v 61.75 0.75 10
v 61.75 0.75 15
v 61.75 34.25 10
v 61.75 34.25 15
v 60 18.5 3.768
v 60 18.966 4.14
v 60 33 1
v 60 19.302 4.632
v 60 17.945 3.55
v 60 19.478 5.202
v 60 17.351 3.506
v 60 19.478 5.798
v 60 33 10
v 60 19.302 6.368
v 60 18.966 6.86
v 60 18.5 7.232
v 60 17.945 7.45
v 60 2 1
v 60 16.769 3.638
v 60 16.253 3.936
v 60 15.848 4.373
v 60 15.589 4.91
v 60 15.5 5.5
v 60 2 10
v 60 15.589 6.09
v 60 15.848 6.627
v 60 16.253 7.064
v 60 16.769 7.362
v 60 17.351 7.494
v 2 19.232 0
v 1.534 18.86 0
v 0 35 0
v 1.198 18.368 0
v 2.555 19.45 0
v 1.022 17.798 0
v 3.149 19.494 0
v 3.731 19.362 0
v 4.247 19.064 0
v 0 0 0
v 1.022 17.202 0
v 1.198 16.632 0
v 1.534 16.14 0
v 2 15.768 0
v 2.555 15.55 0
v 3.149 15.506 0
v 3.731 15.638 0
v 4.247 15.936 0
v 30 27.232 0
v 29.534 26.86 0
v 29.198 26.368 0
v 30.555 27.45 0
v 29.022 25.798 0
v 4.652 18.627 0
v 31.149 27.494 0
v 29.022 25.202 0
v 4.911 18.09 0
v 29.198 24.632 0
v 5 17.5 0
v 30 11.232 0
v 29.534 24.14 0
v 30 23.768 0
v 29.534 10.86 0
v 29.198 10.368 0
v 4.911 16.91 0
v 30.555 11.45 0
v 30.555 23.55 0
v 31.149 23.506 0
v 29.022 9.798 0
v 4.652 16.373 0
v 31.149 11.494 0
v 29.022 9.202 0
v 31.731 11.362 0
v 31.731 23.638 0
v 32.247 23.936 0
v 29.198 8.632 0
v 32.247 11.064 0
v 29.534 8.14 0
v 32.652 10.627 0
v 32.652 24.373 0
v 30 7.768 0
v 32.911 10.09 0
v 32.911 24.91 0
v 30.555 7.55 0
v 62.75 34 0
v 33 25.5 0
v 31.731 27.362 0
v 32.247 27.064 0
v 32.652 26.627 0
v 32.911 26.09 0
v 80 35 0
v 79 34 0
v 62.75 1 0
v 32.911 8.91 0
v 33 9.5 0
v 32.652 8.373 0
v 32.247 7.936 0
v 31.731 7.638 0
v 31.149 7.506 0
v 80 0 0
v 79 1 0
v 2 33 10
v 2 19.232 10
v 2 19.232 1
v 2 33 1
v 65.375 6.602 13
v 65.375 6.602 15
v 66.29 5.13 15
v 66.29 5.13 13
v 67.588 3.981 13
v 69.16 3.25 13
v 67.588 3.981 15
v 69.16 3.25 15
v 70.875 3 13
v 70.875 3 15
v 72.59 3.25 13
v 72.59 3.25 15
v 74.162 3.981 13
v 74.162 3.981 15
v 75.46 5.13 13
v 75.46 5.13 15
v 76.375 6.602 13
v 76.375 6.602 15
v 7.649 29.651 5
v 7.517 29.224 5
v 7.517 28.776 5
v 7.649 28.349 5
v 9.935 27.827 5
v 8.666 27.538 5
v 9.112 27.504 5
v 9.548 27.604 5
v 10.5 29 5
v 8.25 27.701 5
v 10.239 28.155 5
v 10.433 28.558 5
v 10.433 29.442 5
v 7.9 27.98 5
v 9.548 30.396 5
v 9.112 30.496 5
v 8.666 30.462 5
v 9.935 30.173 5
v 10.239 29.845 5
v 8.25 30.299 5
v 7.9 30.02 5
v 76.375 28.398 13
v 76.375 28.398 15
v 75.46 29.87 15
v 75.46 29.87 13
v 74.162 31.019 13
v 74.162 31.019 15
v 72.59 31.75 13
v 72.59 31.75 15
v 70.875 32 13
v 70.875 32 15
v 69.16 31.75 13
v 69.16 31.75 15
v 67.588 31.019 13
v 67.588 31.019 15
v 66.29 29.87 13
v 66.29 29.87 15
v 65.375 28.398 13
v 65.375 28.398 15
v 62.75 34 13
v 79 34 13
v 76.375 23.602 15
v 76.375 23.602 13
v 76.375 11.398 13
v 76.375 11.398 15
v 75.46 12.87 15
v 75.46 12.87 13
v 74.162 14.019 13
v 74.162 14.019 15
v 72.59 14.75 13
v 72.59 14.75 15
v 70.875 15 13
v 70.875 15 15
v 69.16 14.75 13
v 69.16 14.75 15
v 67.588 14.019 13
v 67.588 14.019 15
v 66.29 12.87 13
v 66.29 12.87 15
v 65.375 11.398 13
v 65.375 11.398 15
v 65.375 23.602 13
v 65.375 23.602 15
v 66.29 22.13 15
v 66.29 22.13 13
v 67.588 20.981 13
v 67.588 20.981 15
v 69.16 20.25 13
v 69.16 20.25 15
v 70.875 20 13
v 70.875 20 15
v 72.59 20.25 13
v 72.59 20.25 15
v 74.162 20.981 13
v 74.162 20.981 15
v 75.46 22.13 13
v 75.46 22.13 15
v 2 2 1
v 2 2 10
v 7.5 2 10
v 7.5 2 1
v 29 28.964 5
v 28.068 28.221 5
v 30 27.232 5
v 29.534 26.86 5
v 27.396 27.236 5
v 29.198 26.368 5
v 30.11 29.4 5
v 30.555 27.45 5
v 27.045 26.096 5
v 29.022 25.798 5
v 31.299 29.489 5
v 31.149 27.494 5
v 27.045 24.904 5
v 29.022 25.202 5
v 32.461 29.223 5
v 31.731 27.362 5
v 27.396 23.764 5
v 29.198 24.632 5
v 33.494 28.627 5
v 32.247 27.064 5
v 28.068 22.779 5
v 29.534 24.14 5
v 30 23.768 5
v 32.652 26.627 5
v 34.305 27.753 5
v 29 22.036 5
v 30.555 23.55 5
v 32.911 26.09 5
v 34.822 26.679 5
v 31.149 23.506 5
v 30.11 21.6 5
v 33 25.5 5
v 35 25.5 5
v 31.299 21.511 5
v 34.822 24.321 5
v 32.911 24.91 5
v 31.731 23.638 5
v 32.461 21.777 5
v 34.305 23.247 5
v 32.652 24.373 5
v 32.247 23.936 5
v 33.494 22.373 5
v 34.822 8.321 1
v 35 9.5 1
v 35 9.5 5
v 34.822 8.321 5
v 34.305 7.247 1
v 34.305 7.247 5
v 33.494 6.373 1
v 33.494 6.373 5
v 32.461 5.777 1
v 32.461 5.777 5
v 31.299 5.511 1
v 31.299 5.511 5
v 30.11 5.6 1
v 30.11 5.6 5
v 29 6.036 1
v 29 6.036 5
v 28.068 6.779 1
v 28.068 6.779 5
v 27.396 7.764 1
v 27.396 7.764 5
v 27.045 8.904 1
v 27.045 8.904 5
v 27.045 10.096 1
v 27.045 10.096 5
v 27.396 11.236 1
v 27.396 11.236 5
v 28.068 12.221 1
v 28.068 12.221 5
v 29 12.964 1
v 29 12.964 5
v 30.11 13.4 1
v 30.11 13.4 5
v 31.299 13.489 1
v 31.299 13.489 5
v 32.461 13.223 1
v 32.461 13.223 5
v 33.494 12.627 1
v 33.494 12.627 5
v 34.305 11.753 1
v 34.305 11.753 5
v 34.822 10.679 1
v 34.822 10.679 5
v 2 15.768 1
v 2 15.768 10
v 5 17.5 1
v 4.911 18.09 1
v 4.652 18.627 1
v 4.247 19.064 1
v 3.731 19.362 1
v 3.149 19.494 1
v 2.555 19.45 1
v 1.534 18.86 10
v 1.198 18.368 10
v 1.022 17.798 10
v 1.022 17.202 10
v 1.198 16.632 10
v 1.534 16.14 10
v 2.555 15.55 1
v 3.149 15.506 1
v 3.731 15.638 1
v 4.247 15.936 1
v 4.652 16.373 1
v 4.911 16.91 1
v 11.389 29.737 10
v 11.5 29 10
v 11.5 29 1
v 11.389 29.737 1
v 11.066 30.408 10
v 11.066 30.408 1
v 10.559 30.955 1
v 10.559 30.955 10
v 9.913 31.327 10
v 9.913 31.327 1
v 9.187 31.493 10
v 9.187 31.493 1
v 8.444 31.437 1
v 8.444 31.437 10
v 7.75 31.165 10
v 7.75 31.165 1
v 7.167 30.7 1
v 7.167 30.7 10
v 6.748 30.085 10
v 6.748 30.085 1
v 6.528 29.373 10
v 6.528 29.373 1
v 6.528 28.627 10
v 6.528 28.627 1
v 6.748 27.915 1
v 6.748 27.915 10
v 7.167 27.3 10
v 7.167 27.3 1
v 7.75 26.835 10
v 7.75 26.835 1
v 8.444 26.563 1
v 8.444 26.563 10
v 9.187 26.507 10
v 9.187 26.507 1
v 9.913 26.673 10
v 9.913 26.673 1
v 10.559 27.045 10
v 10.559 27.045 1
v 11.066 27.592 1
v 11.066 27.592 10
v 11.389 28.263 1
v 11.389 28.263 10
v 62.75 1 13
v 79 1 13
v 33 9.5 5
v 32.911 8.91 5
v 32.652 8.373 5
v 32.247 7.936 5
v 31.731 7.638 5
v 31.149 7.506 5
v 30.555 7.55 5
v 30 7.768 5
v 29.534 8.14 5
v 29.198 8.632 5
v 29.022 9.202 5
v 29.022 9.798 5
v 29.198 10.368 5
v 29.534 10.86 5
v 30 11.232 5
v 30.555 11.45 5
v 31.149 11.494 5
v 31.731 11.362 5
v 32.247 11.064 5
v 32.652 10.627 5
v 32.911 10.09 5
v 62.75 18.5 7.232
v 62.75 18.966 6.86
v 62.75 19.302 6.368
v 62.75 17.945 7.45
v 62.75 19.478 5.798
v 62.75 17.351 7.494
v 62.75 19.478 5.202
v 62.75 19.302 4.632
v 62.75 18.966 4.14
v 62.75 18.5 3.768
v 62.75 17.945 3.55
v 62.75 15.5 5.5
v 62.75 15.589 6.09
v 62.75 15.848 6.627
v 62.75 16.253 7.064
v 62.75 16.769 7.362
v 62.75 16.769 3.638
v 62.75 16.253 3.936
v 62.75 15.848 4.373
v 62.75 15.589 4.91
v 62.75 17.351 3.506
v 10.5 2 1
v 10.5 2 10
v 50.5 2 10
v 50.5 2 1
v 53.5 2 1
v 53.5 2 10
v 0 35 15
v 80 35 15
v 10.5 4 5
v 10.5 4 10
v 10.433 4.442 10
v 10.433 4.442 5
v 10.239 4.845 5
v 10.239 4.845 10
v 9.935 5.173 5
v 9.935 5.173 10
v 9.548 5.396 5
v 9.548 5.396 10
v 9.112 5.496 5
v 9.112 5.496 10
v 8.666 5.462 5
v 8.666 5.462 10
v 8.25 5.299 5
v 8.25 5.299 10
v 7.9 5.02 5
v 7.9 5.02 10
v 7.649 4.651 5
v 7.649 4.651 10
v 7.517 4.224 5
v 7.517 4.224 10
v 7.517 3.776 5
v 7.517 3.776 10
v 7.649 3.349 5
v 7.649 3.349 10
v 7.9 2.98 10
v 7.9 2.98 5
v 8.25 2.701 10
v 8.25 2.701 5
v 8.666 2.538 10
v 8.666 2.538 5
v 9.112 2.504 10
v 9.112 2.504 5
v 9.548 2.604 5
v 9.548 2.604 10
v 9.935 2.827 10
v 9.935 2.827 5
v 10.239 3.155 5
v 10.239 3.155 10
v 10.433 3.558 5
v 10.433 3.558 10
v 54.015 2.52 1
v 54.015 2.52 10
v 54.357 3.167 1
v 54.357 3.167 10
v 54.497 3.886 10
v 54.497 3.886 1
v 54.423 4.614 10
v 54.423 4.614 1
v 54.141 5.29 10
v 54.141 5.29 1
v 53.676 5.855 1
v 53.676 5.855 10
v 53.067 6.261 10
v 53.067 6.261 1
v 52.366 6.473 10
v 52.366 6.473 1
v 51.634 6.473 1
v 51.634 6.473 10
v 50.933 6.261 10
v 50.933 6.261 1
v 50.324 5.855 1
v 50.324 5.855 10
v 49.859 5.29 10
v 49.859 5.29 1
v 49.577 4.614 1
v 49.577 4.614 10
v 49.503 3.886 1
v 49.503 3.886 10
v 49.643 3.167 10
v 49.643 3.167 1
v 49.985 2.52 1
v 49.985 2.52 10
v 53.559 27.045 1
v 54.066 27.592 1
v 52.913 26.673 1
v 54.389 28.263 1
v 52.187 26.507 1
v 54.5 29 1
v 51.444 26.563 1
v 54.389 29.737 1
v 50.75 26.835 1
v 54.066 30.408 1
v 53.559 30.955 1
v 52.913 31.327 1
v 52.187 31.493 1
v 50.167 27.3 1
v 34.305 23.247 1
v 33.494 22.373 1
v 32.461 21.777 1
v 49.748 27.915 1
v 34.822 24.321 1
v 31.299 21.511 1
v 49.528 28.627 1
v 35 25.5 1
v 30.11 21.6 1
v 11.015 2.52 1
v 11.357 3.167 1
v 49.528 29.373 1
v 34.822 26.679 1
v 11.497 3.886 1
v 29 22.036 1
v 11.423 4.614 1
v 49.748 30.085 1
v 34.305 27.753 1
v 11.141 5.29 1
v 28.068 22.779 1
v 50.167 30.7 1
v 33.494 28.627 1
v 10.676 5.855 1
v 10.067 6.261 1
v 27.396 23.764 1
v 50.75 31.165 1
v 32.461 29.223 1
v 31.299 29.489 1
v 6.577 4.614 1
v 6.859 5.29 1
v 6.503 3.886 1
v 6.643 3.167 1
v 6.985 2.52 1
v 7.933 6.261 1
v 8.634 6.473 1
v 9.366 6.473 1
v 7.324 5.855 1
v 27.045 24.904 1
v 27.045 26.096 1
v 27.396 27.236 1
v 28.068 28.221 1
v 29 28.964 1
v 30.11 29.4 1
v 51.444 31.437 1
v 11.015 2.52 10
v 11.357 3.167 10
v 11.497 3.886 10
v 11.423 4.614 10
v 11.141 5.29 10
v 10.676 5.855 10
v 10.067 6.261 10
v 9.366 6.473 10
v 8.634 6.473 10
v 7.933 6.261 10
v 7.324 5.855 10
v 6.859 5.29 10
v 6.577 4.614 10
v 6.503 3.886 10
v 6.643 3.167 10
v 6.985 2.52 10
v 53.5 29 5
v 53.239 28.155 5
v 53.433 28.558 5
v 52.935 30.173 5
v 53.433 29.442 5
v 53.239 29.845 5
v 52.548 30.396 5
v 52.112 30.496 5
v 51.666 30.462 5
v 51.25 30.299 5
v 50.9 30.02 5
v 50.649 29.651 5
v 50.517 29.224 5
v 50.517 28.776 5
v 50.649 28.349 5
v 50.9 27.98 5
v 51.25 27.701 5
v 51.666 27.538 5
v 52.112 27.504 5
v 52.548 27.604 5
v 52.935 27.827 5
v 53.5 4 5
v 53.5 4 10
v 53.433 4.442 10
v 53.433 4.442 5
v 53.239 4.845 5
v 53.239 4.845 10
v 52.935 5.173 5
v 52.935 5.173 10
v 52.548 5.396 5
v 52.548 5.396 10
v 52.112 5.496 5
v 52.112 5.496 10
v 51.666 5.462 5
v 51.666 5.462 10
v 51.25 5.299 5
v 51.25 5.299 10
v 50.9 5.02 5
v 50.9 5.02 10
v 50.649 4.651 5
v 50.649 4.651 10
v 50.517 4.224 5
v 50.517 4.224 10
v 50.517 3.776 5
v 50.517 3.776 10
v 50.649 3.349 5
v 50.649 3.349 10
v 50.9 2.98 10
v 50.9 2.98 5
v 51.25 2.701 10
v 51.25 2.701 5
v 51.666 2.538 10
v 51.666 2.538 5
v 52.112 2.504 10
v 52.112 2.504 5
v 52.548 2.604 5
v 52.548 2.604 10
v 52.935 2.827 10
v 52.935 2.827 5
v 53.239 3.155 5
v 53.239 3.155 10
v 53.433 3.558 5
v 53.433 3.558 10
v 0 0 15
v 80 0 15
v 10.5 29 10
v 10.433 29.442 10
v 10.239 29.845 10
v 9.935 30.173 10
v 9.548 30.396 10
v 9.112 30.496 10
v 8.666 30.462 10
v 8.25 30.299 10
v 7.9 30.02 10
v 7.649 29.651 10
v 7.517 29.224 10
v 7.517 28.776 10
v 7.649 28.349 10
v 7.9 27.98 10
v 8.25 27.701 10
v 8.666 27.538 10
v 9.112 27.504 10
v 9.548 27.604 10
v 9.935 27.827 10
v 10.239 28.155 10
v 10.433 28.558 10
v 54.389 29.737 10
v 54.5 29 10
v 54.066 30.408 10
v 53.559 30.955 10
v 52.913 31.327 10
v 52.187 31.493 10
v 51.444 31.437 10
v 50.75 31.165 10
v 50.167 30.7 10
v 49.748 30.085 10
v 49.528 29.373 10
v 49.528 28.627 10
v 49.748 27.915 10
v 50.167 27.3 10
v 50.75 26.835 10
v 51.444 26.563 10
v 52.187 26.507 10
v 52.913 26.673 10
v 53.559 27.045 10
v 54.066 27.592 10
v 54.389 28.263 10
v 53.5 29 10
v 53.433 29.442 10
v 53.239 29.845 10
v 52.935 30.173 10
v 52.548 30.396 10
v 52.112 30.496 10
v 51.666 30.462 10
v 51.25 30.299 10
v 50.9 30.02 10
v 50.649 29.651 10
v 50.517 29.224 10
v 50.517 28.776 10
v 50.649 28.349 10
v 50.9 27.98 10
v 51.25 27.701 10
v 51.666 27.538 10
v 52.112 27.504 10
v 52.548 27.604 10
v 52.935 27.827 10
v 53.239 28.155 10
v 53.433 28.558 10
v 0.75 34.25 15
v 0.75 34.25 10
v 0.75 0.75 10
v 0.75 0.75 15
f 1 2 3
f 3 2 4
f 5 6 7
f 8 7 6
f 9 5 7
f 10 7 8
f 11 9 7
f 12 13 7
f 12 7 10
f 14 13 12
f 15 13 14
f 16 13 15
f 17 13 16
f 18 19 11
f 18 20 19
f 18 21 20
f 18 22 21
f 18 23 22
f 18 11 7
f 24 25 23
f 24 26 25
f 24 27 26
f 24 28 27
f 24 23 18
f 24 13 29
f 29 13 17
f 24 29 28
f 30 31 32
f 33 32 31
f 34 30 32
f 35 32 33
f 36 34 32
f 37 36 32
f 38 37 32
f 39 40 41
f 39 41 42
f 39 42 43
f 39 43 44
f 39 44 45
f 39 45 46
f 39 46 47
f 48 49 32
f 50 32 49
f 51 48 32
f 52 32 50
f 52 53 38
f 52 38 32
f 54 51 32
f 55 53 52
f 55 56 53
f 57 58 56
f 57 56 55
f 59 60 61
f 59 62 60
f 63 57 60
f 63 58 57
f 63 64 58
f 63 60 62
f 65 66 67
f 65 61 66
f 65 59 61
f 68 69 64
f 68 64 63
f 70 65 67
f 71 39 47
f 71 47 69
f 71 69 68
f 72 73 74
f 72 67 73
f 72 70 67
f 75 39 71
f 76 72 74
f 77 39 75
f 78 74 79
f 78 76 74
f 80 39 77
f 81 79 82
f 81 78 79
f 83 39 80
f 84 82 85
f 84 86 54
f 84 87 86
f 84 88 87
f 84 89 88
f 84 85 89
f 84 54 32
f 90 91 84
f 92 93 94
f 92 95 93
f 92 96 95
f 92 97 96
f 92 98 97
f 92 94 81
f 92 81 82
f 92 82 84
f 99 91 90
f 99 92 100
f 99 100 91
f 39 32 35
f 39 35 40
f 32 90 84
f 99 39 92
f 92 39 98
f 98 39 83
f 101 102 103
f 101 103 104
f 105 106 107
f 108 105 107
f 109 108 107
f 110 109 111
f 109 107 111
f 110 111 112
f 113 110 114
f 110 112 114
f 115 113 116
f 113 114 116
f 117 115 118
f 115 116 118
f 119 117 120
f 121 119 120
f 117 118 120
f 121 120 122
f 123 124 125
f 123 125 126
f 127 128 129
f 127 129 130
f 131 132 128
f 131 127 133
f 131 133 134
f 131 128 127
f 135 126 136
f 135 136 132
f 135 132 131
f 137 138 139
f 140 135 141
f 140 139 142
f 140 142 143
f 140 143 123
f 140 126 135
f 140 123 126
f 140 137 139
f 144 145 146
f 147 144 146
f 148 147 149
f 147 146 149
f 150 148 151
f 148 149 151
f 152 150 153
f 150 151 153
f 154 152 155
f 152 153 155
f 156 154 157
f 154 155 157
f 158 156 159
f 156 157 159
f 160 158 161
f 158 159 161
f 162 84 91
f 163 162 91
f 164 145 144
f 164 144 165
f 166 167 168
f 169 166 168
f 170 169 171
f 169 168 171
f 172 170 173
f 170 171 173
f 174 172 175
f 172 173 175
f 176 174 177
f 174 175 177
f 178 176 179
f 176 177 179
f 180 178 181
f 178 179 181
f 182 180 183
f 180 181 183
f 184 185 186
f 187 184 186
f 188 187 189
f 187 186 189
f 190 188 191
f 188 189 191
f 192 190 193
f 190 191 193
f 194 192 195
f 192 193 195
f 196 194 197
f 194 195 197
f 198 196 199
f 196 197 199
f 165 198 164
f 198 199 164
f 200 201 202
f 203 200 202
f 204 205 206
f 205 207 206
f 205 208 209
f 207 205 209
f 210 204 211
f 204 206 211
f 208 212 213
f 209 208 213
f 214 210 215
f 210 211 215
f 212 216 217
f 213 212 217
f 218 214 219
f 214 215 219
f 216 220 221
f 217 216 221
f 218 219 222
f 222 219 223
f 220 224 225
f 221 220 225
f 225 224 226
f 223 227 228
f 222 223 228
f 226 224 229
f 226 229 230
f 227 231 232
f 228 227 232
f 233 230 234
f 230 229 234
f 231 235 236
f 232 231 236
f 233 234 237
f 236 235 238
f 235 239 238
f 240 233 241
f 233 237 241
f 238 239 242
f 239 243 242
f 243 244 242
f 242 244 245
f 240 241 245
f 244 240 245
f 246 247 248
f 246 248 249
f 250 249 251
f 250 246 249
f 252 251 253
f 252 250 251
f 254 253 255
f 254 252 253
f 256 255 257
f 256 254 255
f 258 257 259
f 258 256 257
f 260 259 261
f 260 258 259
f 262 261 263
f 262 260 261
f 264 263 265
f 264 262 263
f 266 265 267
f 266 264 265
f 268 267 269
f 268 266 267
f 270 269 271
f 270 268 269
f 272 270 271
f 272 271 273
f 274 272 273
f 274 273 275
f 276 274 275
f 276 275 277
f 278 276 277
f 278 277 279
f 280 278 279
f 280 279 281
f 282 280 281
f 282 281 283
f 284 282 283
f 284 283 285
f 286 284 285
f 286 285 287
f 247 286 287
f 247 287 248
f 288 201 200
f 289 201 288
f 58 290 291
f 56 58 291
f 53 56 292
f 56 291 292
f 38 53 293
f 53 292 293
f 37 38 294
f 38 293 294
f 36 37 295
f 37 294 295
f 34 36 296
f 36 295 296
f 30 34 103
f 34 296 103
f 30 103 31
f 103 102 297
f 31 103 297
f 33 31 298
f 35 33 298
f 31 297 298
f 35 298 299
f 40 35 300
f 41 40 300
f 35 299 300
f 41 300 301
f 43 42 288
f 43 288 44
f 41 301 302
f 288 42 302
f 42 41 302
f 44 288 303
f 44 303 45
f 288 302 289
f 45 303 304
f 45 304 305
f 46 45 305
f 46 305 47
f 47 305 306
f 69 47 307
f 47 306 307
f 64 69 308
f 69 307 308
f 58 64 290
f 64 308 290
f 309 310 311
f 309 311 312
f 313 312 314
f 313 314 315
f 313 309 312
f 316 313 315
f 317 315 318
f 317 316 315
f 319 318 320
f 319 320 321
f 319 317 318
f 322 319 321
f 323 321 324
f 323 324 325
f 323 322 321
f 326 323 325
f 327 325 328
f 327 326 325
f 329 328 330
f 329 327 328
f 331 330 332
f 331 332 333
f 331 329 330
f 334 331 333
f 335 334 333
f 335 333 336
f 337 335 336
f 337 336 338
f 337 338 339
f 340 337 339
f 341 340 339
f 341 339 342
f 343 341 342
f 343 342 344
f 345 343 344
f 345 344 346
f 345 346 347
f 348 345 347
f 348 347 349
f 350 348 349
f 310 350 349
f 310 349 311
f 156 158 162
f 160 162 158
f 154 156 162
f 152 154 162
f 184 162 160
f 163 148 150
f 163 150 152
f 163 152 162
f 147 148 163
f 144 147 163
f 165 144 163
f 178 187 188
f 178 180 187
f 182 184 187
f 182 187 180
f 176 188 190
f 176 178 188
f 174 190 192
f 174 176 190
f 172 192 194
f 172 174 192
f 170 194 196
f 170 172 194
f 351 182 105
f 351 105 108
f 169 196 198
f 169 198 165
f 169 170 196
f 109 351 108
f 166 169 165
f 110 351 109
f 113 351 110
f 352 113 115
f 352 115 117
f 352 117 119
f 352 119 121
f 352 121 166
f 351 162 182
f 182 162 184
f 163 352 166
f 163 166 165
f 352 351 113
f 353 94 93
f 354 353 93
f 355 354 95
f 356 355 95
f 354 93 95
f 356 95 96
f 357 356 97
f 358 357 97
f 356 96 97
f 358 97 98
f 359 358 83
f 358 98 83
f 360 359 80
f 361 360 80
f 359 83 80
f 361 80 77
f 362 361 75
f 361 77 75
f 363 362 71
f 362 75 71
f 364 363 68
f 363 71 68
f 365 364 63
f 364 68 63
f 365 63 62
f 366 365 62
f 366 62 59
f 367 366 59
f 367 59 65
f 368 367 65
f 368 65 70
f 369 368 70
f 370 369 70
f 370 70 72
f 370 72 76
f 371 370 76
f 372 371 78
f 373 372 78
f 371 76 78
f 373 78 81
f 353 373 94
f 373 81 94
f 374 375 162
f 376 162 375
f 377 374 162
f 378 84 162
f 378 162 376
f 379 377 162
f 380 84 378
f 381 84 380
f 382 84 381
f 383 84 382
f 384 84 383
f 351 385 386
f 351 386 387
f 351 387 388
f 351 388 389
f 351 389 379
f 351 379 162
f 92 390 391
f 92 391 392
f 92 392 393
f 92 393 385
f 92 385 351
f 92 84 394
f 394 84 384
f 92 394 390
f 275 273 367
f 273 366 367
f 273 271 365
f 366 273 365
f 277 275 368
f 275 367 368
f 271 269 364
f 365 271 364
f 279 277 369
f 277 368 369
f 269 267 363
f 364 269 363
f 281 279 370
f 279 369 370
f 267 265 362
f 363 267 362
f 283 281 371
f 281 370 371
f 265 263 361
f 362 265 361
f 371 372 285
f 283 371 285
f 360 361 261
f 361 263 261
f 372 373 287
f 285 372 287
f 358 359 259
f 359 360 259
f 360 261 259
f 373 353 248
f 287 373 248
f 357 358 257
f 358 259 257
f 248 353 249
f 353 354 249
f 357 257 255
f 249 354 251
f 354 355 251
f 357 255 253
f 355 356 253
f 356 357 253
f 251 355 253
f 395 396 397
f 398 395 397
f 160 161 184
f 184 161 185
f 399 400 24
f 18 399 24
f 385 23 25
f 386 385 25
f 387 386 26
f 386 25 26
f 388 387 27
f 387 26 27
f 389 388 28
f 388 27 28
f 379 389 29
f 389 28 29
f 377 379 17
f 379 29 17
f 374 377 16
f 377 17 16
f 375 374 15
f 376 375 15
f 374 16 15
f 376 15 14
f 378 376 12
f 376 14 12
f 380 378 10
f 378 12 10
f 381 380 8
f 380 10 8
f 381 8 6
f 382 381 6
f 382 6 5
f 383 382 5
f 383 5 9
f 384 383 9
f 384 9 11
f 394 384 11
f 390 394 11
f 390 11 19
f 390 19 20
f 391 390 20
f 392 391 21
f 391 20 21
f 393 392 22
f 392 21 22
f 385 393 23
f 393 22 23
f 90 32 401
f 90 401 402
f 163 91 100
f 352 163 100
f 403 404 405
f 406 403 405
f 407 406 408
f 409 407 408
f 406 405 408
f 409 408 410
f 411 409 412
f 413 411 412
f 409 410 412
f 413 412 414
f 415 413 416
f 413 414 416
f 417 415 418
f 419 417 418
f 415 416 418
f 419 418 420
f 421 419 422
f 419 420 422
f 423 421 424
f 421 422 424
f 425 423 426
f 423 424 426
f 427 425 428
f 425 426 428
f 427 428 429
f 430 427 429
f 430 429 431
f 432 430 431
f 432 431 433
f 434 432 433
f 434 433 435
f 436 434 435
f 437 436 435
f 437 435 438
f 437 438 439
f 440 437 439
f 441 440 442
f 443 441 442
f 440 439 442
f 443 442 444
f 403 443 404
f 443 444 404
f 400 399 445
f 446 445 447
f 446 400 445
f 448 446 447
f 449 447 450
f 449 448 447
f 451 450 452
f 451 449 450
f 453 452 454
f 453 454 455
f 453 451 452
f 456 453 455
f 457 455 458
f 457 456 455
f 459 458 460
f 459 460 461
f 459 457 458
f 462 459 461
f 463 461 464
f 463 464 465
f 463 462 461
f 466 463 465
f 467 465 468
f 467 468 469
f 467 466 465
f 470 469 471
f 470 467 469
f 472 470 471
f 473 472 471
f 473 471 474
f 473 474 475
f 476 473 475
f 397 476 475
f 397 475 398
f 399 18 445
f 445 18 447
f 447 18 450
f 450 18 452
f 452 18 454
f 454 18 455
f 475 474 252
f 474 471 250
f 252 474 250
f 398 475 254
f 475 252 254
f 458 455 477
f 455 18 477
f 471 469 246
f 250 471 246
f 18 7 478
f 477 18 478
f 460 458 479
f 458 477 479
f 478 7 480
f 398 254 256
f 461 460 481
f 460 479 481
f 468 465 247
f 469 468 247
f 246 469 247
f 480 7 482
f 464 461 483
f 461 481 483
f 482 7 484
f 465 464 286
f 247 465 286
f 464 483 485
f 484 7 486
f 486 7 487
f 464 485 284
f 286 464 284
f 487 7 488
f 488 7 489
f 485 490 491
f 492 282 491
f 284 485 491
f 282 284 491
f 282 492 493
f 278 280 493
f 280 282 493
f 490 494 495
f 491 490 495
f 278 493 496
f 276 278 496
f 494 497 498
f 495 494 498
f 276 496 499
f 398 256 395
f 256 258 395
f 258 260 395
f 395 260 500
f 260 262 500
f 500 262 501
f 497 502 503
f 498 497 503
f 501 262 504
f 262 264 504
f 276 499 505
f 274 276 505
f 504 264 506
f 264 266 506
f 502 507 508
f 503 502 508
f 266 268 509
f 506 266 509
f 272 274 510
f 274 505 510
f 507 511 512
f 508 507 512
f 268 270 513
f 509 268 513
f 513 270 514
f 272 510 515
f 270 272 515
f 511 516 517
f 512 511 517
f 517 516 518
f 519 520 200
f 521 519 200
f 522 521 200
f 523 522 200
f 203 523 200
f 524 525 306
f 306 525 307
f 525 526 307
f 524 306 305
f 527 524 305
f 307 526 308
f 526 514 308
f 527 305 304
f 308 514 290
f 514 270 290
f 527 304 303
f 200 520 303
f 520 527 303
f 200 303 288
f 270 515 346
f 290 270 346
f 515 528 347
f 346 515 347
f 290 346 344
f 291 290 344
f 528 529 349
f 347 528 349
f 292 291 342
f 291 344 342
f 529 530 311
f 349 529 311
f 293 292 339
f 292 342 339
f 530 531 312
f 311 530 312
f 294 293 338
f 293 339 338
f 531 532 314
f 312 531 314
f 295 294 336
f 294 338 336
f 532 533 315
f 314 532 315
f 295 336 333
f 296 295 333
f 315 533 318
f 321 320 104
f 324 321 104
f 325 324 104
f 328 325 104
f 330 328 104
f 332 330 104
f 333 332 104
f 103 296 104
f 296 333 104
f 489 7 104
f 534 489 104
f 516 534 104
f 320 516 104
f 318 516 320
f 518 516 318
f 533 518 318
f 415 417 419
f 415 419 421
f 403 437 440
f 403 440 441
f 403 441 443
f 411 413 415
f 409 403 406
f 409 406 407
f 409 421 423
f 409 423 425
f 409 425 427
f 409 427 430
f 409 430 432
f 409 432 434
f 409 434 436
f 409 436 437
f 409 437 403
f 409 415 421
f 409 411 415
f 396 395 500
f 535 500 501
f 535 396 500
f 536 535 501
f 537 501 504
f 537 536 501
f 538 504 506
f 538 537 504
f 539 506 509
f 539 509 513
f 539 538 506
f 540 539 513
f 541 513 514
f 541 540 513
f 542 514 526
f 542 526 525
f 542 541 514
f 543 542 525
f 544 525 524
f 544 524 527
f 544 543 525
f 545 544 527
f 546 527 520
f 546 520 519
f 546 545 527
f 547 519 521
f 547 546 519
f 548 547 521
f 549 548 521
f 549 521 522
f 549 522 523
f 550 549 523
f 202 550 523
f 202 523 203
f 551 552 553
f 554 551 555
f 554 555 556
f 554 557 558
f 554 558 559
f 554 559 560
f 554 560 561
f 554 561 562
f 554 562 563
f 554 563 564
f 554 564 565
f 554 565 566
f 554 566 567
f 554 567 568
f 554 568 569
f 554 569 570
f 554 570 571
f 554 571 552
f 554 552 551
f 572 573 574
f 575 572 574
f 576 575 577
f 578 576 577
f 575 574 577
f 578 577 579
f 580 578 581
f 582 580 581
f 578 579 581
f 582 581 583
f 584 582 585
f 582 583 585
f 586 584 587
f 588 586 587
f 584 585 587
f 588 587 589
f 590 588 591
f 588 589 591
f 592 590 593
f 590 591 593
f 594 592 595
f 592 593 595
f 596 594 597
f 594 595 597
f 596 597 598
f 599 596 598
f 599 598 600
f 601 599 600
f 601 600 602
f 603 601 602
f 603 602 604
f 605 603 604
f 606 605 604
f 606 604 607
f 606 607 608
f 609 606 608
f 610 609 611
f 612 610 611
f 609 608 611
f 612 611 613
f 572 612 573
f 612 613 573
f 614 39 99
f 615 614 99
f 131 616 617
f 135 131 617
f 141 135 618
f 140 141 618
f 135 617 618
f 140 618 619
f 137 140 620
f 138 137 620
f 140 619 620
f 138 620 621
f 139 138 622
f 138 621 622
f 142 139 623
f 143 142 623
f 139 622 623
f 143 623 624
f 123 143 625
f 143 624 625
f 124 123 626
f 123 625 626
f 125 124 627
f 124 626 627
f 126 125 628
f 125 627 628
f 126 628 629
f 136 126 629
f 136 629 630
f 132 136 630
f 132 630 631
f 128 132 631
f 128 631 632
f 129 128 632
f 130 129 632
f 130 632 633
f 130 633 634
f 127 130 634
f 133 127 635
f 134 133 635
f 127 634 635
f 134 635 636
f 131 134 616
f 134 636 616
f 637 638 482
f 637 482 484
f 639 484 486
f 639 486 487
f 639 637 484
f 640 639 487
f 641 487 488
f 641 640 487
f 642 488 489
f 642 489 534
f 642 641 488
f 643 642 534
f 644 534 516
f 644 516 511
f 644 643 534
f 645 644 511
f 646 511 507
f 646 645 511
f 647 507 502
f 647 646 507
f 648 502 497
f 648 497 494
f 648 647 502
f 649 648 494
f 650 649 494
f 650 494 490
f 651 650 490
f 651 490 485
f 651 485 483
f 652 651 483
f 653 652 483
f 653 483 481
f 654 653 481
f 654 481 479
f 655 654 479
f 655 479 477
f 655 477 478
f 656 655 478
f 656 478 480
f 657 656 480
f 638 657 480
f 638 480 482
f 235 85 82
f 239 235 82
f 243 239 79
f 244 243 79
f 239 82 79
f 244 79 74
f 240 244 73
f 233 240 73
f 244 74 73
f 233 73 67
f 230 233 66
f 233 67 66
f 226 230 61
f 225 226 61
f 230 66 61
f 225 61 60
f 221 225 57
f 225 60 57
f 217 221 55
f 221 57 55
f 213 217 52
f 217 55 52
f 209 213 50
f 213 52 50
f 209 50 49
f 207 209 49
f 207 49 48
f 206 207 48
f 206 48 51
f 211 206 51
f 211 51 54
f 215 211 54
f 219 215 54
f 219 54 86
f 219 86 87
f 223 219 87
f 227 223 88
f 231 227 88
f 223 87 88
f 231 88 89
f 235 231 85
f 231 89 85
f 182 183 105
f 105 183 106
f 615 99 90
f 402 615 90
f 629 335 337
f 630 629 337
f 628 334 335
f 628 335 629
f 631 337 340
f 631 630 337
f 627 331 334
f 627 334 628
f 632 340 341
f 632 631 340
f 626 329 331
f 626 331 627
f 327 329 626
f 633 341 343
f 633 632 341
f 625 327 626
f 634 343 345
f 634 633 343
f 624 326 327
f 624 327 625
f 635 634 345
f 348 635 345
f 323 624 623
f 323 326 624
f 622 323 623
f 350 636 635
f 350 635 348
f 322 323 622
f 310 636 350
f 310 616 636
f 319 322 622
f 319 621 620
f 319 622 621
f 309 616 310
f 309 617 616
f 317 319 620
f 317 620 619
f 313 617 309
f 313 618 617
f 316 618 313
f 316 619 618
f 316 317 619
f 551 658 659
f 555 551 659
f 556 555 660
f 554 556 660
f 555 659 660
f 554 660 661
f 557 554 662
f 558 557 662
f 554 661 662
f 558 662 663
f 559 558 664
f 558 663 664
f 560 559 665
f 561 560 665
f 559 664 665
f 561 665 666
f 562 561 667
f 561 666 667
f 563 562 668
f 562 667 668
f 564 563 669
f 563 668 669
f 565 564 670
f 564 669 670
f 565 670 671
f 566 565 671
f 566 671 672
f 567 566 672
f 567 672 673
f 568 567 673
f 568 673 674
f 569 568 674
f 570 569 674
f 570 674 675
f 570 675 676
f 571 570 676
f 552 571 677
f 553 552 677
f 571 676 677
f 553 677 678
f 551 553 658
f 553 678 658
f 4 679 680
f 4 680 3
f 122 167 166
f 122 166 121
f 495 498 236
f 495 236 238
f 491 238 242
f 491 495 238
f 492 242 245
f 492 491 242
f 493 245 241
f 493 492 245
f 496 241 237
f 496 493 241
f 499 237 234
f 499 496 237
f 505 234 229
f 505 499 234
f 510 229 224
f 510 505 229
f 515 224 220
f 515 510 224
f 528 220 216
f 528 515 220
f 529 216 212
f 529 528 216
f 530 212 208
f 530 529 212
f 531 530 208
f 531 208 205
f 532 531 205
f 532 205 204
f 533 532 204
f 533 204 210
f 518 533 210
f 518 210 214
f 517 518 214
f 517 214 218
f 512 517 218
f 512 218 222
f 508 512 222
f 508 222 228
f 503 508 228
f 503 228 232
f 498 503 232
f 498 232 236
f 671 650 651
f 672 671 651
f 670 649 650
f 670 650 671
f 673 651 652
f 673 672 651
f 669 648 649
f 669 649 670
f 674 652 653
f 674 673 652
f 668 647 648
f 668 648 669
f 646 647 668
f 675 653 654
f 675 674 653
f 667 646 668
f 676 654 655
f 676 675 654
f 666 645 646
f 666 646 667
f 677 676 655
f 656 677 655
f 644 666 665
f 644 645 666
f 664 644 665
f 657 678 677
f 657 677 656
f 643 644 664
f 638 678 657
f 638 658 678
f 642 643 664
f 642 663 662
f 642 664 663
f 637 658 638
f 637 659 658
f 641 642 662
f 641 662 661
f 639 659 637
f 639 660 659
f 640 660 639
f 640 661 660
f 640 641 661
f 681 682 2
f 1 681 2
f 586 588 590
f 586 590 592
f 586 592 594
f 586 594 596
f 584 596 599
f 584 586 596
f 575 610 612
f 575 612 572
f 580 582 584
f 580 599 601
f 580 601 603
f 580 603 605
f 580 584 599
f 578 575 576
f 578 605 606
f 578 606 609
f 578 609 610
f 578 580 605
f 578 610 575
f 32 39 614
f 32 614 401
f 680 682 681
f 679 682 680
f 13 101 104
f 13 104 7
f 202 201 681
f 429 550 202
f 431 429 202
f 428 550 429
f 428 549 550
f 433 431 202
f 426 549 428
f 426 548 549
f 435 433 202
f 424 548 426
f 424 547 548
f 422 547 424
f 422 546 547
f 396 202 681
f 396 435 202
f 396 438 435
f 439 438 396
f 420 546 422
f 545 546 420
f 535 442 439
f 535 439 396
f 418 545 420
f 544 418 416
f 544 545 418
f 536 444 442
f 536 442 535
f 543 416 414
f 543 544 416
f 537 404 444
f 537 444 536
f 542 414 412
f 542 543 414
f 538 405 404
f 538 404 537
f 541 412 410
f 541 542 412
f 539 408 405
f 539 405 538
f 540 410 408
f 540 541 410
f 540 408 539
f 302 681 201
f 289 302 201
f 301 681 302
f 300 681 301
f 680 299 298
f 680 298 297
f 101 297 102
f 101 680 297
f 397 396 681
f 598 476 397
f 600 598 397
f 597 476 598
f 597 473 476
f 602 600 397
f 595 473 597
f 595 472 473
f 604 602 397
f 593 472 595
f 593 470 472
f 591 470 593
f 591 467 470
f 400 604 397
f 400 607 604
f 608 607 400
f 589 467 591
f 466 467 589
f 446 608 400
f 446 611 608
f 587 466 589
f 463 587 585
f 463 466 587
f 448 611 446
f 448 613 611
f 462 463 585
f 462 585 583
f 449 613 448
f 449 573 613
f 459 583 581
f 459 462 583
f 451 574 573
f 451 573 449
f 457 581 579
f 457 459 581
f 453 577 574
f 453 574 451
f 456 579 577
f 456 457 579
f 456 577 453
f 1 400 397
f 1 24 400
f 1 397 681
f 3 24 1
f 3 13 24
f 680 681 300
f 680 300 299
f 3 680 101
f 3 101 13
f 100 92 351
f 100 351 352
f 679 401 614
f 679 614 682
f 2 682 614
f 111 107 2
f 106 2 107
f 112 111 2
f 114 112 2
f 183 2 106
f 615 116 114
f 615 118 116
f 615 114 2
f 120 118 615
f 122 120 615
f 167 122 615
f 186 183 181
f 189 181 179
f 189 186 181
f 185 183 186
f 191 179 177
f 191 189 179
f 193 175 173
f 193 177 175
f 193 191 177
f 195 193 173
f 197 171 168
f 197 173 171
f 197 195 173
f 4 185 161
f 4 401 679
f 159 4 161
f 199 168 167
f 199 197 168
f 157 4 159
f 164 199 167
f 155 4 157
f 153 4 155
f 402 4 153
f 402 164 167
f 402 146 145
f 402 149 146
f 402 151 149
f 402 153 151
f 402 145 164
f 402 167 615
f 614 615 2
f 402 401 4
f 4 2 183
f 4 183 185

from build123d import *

# Parameters (mm, degrees)
SKETCH_W             = 80
SKETCH_H             = 35
PAD_DEPTH            = 15
SKETCH001_R          = 2.5
POCKET_DEPTH         = 14
SKETCH002_W          = 61
SKETCH002_H          = 33.5
POCKET001_DEPTH      = 5
SKETCH003_R          = 1.5
POCKET002_DEPTH      = 5
SKETCH004_R          = 4
PAD001_DEPTH         = 5
SKETCH005_R          = 2
POCKET003_DEPTH      = 5
SKETCH006_W          = 16.25
SKETCH006_H          = 33
POCKET004_DEPTH      = 13
POCKET005_DEPTH      = 15.001
SKETCH008_R          = 2
POCKET006_DEPTH      = 5.001
POCKET006_DEPTH_BACK = -10.001
SKETCH009_R          = 2
POCKET007_DEPTH      = 2.75


with BuildPart() as part:
    # Sketch → Pad (new body)
    with BuildSketch(Plane.XY):
        with Locations((40, 17.5)):
            Rectangle(SKETCH_W, SKETCH_H)
    extrude(amount=PAD_DEPTH)

    # Sketch001 (on Face6 of Pad) → Pocket (cut)
    with BuildSketch(Plane.XY.offset(15)):
        with BuildLine():
            Line((2, 33), (60, 33))
            Line((60, 33), (60, 2))
            Line((53.5, 2), (60, 2))
            ThreePointArc((53.5, 2), (52, 6.5), (50.5, 2))
            Line((10.5, 2), (50.5, 2))
            ThreePointArc((10.5, 2), (9, 6.5), (7.5, 2))
            Line((2, 2), (7.5, 2))
            Line((2, 2), (2, 33))
        make_face()
        with Locations((9, 29)):
            Circle(SKETCH001_R, mode=Mode.SUBTRACT)
        with Locations((52, 29)):
            Circle(SKETCH001_R, mode=Mode.SUBTRACT)
    extrude(amount=-POCKET_DEPTH, mode=Mode.SUBTRACT)

    # Sketch002 (on Face5 of Pocket) → Pocket001 (cut)
    with BuildSketch(Plane.XY.offset(15)):
        with Locations((31.25, 17.5)):
            Rectangle(SKETCH002_W, SKETCH002_H)
    extrude(amount=-POCKET001_DEPTH, mode=Mode.SUBTRACT)

    # Sketch003 (on Face24 of Pocket001) → Pocket002 (cut)
    with BuildSketch(Plane.XY.offset(10)):
        with Locations((9, 29)):
            Circle(SKETCH003_R)
        with Locations((9, 4)):
            Circle(SKETCH003_R)
        with Locations((52, 29)):
            Circle(SKETCH003_R)
        with Locations((52, 4)):
            Circle(SKETCH003_R)
    extrude(amount=-POCKET002_DEPTH, mode=Mode.SUBTRACT)

    # Sketch004 (on Face4 of Pocket002) → Pad001 (join)
    with BuildSketch(Plane(origin=(0, 0, 0), x_dir=(1, 0, 0), z_dir=(0, 0, -1))):
        with Locations((31, -9.5)):
            Circle(SKETCH004_R)
        with Locations((31, -25.5)):
            Circle(SKETCH004_R)
    extrude(amount=-PAD001_DEPTH)

    # Sketch005 (on Face4 of Pad001) → Pocket003 (cut)
    with BuildSketch(Plane(origin=(0, 0, 0), x_dir=(1, 0, 0), z_dir=(0, 0, -1))):
        with Locations((31, -9.5)):
            Circle(SKETCH005_R)
        with Locations((31, -25.5)):
            Circle(SKETCH005_R)
    extrude(amount=-POCKET003_DEPTH, mode=Mode.SUBTRACT)

    # Sketch006 (on Face4 of Pocket003) → Pocket004 (cut)
    with BuildSketch(Plane(origin=(0, 0, 0), x_dir=(1, 0, 0), z_dir=(0, 0, -1))):
        with Locations((70.875, -17.5)):
            Rectangle(SKETCH006_W, SKETCH006_H)
    extrude(amount=-POCKET004_DEPTH, mode=Mode.SUBTRACT)

    # Sketch007 (on Face5 of Pocket004) → Pocket005 (cut, through all)
    with BuildSketch(Plane.XY.offset(15)):
        with BuildLine():
            Line((65.375, 28.397916), (65.375, 23.602084))
            ThreePointArc((65.375, 23.602084), (70.875, 20), (76.375, 23.602084))
            Line((76.375, 28.397916), (76.375, 23.602084))
            ThreePointArc((76.375, 28.397916), (70.875, 32), (65.375, 28.397916))
        make_face()
        with BuildLine():
            Line((65.375, 11.397916), (65.375, 6.602084))
            ThreePointArc((65.375, 6.602084), (70.875, 3), (76.375, 6.602084))
            Line((76.375, 11.397916), (76.375, 6.602084))
            ThreePointArc((76.375, 11.397916), (70.875, 15), (65.375, 11.397916))
        make_face()
    extrude(amount=-POCKET005_DEPTH, mode=Mode.SUBTRACT)

    # Sketch008 (on Face43 of Pocket005) → Pocket006 (cut, two sides)
    with BuildSketch(Plane.XY.offset(5)) as pocket006_sk:
        with Locations((3, 17.5)):
            Circle(SKETCH008_R)
    extrude(amount=-POCKET006_DEPTH, mode=Mode.SUBTRACT)
    extrude(pocket006_sk.sketch, amount=-POCKET006_DEPTH_BACK, mode=Mode.SUBTRACT)

    # Sketch009 (on Face37 of Pocket006) → Pocket007 (cut)
    with BuildSketch(Plane(origin=(60, 0, 0), x_dir=(0, -1, 0), z_dir=(-1, 0, 0))):
        with Locations((-17.5, 5.5)):
            Circle(SKETCH009_R)
    extrude(amount=-POCKET007_DEPTH, mode=Mode.SUBTRACT)


solid = part.part
